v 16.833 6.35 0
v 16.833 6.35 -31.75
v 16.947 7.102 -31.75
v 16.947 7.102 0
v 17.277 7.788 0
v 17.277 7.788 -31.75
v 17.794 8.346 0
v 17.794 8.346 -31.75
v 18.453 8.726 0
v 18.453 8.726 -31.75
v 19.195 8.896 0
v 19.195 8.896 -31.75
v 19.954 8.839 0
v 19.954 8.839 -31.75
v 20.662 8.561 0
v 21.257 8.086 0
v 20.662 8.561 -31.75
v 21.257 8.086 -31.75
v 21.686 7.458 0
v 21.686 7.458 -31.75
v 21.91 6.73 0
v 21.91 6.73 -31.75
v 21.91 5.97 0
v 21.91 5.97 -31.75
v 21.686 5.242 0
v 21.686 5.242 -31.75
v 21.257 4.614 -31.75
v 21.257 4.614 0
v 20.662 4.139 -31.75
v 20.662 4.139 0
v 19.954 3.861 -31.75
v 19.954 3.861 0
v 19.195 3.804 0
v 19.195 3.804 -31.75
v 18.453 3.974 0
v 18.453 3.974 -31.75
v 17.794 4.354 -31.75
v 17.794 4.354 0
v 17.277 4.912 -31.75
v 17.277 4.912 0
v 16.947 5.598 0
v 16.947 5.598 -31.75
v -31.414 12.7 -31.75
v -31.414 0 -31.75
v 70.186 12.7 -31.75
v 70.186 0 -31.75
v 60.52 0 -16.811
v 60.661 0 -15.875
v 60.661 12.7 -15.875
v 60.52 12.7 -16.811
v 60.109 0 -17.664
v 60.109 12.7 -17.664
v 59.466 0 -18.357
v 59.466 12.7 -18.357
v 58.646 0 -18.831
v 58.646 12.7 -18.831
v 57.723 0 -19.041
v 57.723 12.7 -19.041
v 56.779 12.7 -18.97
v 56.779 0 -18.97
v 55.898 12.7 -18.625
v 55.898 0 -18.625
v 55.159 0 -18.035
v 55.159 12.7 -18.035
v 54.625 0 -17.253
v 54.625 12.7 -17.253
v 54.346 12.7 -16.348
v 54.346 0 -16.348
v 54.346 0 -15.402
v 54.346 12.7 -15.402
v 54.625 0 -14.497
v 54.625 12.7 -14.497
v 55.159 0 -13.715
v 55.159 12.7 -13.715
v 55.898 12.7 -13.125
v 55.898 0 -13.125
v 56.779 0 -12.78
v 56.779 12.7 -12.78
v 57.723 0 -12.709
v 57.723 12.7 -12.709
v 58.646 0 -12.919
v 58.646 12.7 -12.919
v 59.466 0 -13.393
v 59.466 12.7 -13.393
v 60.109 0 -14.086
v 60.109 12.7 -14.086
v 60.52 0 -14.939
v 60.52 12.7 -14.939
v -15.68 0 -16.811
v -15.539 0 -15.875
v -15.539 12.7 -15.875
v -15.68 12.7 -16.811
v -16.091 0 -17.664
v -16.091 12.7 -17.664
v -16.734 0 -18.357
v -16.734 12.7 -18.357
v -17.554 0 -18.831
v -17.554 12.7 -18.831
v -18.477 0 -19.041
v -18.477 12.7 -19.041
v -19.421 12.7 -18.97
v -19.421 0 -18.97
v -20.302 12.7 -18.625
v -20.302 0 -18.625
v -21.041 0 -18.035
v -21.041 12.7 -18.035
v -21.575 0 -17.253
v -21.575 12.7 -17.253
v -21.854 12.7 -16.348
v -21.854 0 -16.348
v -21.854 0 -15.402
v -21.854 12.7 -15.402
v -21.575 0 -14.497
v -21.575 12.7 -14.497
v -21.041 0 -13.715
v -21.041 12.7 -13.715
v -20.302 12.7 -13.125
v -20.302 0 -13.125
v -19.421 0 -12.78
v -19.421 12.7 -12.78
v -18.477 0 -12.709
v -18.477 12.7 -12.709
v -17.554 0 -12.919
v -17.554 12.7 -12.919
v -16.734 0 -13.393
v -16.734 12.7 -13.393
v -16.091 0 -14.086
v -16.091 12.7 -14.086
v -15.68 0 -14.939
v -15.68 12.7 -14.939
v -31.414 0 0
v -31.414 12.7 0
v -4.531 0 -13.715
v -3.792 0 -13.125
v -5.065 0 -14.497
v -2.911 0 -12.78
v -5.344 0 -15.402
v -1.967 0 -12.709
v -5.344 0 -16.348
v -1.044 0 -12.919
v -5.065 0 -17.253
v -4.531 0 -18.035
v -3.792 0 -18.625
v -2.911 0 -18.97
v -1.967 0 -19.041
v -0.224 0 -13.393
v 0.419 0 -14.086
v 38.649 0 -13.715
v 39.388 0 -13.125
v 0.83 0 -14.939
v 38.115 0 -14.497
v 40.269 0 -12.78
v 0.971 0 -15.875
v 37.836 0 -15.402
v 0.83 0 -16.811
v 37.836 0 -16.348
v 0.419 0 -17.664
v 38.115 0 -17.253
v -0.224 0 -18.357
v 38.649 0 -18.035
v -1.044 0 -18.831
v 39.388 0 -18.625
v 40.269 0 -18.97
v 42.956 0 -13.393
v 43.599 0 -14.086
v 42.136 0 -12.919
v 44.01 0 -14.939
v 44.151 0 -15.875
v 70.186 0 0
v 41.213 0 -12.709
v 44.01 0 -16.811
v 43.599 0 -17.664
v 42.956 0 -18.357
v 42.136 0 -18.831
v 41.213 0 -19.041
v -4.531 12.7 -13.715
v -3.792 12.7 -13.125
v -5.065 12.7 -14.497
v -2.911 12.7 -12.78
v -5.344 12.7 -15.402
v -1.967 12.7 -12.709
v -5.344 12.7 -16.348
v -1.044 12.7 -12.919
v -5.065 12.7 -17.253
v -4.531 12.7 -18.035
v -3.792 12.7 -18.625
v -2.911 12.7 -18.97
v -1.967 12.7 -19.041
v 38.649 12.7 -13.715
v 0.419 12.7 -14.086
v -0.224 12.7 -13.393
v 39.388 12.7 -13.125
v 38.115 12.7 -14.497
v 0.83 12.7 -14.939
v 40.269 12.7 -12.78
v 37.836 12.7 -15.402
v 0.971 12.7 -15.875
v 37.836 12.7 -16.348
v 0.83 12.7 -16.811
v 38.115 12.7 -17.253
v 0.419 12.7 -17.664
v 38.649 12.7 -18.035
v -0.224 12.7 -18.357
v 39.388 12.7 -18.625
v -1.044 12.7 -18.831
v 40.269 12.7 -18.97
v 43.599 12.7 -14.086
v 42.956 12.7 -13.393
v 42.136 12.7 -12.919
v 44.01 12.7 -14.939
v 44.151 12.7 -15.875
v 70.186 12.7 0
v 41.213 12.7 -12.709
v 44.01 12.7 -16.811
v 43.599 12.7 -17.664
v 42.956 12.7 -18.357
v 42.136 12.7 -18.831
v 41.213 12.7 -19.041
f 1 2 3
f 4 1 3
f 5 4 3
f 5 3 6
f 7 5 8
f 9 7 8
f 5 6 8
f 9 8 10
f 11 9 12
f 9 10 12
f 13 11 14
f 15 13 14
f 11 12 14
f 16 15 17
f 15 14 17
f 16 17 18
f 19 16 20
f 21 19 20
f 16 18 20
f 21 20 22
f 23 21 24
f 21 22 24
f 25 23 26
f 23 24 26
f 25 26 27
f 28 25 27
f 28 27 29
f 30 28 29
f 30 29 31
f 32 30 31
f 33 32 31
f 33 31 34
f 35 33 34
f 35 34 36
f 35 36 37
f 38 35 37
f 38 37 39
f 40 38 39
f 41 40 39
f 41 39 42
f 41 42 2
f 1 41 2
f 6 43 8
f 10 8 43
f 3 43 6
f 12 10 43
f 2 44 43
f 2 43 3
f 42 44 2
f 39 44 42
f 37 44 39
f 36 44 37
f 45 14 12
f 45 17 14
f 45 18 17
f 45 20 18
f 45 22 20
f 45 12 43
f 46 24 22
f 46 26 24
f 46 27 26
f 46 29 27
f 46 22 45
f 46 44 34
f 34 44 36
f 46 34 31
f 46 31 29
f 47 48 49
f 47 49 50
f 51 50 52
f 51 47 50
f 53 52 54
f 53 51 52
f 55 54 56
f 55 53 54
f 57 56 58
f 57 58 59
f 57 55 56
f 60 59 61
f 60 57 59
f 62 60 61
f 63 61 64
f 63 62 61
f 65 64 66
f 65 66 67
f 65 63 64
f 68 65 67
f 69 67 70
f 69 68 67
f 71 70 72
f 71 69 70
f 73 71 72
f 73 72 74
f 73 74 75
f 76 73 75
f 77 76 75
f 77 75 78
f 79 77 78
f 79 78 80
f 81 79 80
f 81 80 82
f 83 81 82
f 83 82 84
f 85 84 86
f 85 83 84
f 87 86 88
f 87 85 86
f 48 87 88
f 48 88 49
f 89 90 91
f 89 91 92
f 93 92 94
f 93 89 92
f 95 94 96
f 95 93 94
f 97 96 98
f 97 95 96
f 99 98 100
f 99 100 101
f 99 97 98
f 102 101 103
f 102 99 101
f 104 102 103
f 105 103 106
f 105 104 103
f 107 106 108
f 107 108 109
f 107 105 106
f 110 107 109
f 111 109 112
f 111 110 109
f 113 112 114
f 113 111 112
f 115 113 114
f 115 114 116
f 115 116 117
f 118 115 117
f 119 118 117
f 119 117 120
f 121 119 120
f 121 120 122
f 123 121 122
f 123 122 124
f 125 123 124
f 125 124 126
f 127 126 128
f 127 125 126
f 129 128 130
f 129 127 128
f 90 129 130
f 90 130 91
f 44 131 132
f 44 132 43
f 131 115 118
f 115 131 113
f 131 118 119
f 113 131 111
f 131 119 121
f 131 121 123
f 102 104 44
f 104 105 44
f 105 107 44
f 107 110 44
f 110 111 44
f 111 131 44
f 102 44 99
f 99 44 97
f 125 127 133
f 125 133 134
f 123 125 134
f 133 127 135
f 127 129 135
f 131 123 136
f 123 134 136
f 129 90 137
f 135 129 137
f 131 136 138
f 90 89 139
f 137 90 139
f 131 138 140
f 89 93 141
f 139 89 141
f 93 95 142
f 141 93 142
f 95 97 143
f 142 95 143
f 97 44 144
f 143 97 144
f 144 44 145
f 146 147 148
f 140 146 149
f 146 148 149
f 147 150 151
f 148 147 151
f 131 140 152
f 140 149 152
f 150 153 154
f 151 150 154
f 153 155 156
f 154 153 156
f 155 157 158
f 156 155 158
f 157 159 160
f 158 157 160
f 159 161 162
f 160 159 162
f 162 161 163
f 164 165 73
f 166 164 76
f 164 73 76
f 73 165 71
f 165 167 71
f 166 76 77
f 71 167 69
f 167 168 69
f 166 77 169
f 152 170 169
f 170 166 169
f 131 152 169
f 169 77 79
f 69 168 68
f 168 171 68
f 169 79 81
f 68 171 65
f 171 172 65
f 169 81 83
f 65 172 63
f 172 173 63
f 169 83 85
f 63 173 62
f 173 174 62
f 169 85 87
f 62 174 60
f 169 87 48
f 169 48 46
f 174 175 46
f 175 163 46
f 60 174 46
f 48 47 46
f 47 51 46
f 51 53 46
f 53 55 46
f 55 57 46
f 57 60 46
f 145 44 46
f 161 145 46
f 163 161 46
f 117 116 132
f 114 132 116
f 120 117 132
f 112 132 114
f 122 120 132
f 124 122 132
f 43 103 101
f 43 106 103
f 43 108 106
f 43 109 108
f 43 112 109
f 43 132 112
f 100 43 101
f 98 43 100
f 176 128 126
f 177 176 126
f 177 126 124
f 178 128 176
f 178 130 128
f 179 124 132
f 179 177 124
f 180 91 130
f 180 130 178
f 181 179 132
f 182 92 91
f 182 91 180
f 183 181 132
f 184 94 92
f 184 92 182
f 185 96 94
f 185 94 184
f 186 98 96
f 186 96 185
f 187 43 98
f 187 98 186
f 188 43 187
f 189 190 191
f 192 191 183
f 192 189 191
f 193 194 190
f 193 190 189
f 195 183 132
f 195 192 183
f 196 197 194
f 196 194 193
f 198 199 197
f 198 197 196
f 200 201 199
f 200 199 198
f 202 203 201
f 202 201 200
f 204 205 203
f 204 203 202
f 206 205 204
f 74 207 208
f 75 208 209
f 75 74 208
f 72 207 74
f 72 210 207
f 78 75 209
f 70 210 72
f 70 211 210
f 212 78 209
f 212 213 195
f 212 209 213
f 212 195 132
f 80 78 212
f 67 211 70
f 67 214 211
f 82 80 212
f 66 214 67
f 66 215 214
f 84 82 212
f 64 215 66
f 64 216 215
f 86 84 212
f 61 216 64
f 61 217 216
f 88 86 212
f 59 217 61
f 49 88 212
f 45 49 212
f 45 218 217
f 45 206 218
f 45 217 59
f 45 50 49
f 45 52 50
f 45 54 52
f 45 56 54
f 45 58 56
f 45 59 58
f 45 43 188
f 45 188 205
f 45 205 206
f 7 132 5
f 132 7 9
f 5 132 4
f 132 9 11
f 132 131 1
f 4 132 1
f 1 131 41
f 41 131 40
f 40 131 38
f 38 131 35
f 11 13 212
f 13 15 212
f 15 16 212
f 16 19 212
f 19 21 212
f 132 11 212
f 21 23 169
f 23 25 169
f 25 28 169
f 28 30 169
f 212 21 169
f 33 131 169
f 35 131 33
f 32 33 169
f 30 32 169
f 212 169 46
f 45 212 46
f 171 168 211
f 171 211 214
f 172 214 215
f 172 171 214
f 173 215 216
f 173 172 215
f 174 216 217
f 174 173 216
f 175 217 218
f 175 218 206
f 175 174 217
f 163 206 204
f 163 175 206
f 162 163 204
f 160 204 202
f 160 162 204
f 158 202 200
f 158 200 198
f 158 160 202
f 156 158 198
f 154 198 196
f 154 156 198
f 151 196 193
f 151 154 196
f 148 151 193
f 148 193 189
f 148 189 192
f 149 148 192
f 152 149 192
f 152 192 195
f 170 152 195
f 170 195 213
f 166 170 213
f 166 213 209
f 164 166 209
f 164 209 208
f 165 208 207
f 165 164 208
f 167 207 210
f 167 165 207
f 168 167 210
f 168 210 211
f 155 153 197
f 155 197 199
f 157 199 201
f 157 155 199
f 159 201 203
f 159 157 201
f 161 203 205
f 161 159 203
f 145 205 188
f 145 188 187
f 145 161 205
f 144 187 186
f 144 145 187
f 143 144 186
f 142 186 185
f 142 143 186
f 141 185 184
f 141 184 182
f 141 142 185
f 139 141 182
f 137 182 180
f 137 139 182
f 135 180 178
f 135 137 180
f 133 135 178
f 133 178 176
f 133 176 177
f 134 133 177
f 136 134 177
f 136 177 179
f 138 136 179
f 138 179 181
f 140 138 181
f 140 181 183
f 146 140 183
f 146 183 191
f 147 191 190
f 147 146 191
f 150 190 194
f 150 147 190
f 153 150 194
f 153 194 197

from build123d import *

# Parameters (mm, degrees)
SKETCH1_W               = 101.6
SKETCH1_H               = 31.75
SKETCH1_R               = 3.175
BOSS_EXTRUDE1_DEPTH     = 12.7
F_1_4_20_TAPPED_HOLE1_D = 5.1054


with BuildPart() as part:
    # Sketch1 → Boss-Extrude1 (new body)
    with BuildSketch(Plane(origin=(0, 0, 0), x_dir=(1, 0, 0), z_dir=(0, 1, 0))):
        with Locations((19.385978836, 15.875)):
            Rectangle(SKETCH1_W, SKETCH1_H)
        with Locations((-18.714021164, 15.875)):
            Circle(SKETCH1_R, mode=Mode.SUBTRACT)
        with Locations((57.485978836, 15.875)):
            Circle(SKETCH1_R, mode=Mode.SUBTRACT)
        with Locations((-2.204021164, 15.875)):
            Circle(SKETCH1_R, mode=Mode.SUBTRACT)
        with Locations((40.975978836, 15.875)):
            Circle(SKETCH1_R, mode=Mode.SUBTRACT)
    extrude(amount=BOSS_EXTRUDE1_DEPTH)

    # 1/4-20 Tapped Hole1 (through all)
    with Locations(Plane(origin=(19.385978836, 6.35, 0), x_dir=(1, 0, 0), z_dir=(0, 0, 1))):
        with Locations((0, 0)):
            Hole(F_1_4_20_TAPPED_HOLE1_D / 2)


solid = part.part
